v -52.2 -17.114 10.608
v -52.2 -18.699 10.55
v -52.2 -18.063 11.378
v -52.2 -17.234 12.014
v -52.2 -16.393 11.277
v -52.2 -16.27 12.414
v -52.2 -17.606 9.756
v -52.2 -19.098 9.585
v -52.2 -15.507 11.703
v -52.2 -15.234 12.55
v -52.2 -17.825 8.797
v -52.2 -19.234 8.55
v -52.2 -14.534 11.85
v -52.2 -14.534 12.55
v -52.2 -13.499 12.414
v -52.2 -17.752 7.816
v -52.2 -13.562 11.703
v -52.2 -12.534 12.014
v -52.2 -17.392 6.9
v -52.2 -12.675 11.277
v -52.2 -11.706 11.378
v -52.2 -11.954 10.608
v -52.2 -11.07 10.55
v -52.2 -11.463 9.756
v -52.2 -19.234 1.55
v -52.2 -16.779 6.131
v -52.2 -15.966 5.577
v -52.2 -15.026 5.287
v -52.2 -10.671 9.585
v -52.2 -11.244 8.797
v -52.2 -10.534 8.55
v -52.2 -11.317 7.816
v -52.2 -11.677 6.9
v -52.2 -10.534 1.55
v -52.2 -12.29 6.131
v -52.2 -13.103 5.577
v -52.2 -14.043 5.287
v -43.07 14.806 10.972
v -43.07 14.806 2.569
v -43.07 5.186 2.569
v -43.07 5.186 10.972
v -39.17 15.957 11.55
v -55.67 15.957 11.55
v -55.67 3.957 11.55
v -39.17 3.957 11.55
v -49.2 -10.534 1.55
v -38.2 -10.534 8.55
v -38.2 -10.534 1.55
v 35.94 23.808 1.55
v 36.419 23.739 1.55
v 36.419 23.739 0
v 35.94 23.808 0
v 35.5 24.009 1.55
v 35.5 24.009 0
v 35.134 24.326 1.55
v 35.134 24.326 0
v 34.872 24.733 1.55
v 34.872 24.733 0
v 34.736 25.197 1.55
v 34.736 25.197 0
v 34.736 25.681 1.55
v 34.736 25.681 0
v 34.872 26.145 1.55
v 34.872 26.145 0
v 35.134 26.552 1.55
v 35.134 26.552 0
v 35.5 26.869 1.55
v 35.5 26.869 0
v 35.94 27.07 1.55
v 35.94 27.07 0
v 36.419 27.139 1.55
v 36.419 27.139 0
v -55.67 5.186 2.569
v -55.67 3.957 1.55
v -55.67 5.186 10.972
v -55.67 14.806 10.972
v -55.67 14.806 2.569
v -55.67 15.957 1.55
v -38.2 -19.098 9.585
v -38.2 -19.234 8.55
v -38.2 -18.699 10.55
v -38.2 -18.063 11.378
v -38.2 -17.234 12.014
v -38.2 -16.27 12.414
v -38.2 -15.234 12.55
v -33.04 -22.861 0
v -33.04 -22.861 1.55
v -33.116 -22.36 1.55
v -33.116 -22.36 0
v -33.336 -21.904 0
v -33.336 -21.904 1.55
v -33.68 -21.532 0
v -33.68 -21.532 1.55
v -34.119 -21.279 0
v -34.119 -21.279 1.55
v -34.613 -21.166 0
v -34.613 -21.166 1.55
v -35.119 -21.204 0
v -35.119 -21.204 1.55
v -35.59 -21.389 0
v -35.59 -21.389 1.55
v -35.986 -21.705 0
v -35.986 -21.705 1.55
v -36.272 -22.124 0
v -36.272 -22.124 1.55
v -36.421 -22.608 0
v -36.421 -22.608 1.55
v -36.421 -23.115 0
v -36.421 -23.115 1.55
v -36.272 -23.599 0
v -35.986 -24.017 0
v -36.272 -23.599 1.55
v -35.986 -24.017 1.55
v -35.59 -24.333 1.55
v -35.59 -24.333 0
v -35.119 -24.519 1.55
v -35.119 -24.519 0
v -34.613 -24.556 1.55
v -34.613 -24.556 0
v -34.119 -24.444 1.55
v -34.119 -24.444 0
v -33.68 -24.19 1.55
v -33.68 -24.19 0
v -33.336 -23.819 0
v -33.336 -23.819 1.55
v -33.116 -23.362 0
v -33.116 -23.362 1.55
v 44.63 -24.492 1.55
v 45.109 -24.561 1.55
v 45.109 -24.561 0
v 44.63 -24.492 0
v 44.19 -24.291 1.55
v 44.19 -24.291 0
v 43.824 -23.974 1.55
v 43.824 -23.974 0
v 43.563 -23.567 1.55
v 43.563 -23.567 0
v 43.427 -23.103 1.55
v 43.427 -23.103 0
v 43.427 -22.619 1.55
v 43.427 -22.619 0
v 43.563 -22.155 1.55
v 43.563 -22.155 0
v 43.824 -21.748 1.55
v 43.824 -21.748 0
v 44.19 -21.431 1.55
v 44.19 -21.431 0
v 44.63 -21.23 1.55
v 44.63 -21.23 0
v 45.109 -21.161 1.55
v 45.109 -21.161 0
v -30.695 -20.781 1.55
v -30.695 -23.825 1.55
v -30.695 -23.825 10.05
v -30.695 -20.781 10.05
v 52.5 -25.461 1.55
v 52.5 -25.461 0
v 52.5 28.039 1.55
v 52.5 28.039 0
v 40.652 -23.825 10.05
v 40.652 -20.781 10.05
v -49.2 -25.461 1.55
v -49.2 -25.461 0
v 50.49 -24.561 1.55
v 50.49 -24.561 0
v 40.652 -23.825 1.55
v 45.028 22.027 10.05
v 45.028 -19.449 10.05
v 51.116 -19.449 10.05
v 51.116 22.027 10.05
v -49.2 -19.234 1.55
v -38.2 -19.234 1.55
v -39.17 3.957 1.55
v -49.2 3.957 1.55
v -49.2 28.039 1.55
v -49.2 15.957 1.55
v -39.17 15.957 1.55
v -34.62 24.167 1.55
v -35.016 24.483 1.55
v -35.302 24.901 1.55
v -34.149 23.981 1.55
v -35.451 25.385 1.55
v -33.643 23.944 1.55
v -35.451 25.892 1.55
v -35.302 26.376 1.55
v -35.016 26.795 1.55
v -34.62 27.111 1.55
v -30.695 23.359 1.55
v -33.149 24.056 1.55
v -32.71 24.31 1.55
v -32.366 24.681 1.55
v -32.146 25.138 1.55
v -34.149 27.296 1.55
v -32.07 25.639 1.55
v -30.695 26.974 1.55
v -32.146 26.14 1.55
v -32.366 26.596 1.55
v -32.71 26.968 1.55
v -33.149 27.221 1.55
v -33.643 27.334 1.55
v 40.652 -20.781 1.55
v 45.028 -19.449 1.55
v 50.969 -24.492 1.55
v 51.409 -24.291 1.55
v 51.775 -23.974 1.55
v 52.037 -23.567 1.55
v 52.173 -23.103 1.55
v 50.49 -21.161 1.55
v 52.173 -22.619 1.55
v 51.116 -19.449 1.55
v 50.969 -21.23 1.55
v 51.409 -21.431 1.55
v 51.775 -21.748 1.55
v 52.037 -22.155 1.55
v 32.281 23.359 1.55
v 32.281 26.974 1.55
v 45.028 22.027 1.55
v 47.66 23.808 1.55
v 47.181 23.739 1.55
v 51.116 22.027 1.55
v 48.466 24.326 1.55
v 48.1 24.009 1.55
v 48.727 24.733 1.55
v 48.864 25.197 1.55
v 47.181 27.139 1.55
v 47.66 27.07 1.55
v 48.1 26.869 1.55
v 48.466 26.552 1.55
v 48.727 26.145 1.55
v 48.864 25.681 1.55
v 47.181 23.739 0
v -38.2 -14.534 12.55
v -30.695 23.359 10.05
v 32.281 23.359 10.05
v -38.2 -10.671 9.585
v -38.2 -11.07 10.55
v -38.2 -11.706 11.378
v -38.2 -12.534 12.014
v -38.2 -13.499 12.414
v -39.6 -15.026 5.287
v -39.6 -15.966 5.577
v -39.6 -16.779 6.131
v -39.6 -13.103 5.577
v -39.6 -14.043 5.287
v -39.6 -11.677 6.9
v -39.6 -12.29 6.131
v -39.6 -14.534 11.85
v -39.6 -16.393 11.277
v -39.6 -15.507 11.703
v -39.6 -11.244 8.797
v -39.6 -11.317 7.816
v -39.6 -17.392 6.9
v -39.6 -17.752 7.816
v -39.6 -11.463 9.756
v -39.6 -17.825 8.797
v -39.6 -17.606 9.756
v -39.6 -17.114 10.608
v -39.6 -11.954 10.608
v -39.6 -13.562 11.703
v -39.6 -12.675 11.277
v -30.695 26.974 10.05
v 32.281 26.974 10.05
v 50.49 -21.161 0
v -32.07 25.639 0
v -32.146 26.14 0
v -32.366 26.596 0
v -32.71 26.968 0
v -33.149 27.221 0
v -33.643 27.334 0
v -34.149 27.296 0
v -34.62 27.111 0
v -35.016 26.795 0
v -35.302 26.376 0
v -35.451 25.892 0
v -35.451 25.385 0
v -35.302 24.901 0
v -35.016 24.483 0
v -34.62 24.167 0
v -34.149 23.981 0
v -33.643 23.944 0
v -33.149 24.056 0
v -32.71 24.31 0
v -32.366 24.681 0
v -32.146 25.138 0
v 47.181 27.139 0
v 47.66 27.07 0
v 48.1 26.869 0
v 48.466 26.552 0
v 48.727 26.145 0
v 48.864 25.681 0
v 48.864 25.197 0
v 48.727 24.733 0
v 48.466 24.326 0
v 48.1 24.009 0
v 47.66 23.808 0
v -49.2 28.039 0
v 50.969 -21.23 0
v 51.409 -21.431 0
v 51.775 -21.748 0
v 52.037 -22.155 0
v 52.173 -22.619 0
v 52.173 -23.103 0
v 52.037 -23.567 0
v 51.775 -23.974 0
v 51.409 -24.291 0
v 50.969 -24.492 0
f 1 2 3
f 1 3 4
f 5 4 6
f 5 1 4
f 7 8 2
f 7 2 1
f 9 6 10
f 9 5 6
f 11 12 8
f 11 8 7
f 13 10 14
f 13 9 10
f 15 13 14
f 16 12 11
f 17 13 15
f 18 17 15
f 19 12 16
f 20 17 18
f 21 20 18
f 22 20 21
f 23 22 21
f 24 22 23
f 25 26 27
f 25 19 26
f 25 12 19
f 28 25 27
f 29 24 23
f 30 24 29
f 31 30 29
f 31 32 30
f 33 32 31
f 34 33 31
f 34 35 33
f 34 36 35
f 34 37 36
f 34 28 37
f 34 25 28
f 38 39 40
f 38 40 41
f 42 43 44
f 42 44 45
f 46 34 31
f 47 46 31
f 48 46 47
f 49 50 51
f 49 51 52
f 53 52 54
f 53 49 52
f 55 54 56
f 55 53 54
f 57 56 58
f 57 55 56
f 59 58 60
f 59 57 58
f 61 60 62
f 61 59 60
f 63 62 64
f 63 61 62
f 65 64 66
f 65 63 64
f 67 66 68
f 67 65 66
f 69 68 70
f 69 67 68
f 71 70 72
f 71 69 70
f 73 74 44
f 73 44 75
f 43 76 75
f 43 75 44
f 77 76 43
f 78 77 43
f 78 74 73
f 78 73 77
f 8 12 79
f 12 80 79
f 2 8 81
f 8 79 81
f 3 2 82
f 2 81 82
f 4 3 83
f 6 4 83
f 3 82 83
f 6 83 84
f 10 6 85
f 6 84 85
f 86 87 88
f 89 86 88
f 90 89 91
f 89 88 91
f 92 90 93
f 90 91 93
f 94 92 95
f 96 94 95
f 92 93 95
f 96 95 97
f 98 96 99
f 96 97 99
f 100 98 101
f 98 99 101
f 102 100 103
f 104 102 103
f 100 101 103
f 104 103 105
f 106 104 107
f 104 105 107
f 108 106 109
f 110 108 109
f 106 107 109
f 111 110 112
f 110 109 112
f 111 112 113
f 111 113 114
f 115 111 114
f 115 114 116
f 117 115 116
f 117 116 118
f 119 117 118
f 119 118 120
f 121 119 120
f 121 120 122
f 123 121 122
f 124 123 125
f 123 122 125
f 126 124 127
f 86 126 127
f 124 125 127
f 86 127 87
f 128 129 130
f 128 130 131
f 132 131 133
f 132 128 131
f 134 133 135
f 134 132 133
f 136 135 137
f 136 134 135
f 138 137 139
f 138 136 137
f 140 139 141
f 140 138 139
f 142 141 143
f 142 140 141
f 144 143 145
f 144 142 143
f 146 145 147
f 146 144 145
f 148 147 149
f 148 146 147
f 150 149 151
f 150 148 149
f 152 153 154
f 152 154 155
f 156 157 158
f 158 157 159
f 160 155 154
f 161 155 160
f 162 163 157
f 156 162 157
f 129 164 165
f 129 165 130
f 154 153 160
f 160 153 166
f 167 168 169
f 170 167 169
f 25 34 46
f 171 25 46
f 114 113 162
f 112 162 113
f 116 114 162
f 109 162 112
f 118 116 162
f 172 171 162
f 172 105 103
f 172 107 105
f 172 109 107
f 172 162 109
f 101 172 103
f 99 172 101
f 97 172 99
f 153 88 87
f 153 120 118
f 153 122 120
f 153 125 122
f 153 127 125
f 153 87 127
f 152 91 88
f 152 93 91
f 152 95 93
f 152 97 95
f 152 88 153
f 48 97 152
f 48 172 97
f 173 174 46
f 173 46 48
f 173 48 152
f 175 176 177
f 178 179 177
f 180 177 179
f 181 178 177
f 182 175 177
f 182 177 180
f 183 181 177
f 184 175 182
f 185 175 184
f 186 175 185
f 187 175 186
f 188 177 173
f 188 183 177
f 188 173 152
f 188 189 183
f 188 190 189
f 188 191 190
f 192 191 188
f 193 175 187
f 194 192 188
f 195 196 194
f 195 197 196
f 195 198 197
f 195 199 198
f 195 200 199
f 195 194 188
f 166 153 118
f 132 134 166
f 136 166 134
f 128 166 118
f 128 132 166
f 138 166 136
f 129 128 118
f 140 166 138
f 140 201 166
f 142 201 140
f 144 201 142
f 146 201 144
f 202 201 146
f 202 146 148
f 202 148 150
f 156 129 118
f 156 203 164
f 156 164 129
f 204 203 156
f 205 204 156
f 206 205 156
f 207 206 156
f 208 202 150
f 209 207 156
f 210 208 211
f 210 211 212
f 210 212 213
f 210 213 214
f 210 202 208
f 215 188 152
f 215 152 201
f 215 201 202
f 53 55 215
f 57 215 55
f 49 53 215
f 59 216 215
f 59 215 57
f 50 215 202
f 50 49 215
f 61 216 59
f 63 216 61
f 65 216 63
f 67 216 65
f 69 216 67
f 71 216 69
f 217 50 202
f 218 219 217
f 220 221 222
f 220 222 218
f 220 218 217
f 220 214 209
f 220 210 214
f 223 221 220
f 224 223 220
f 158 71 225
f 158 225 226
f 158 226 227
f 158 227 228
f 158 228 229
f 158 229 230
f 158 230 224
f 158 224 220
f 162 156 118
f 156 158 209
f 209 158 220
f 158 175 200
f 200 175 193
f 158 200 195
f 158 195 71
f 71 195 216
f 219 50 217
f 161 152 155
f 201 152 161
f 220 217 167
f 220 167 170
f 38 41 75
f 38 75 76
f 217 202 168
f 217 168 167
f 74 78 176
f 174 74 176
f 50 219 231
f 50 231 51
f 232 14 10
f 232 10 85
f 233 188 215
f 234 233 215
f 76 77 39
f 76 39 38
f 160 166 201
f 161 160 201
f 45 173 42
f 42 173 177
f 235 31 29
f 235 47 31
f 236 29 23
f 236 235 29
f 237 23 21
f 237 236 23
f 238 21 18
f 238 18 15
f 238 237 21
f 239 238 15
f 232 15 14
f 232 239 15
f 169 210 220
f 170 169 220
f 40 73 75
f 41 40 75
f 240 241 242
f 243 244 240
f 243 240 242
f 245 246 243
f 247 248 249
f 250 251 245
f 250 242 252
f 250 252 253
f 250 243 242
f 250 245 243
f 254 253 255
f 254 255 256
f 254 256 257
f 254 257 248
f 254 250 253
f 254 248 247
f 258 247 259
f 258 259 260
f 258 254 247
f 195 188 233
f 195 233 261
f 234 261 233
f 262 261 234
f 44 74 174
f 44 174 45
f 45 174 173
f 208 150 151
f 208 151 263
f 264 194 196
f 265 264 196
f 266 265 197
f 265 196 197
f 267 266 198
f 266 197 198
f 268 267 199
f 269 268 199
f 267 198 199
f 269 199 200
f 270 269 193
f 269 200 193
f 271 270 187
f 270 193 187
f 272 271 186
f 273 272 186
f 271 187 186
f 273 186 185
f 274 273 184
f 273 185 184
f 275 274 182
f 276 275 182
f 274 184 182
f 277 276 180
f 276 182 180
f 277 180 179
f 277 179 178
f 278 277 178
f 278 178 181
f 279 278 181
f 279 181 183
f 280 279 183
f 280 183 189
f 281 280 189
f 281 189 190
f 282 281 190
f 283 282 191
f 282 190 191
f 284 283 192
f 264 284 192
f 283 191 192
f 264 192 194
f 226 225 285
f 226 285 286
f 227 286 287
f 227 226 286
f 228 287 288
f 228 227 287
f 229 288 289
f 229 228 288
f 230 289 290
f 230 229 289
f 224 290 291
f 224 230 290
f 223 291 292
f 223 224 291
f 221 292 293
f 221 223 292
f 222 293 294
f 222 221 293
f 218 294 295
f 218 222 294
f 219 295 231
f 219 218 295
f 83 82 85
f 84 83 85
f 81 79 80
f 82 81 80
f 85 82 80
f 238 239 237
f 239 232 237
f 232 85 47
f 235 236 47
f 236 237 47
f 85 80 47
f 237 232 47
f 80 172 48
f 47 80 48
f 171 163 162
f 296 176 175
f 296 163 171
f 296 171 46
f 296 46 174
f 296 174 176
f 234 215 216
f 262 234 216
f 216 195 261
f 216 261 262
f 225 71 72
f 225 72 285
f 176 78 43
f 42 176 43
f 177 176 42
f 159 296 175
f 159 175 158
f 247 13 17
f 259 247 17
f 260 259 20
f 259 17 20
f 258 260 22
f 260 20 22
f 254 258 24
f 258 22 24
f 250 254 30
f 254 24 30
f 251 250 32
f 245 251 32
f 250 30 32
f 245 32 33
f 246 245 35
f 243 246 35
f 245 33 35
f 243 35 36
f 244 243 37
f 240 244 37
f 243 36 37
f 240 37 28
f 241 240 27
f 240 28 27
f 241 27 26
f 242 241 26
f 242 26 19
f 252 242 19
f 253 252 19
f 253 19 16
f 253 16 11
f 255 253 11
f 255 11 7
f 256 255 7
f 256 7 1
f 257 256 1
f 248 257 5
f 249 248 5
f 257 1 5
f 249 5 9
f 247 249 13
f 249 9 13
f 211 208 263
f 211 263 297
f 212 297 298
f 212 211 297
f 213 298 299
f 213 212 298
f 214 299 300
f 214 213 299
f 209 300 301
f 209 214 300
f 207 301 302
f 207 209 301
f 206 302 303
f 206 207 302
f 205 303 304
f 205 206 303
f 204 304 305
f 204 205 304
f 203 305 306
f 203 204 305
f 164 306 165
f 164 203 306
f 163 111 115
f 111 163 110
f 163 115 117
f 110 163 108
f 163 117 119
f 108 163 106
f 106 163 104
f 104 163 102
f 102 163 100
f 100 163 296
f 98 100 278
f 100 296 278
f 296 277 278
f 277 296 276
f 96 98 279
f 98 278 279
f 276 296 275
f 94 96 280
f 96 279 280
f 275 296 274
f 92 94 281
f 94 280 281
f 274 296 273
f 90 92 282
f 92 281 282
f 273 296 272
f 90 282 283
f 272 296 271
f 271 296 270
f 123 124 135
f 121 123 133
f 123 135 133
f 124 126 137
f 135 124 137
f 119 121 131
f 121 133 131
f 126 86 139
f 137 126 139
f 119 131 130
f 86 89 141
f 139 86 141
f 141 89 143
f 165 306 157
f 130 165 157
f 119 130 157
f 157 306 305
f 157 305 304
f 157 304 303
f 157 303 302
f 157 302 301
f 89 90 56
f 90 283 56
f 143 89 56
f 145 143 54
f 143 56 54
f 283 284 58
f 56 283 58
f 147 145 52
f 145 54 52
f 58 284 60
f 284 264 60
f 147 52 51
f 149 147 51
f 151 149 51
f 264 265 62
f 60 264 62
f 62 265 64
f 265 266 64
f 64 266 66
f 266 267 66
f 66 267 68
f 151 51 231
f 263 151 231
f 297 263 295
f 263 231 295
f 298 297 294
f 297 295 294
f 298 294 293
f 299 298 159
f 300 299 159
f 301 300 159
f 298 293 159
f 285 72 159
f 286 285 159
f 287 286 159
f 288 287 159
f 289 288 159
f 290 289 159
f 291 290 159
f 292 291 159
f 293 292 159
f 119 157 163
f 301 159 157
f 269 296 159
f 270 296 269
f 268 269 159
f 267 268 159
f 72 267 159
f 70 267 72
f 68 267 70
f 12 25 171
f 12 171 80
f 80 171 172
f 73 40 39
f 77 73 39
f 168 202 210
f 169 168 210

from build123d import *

# Parameters (mm, degrees)
SKETCH_1_W          = 101.7
SKETCH_1_H          = 53.5
EXTRUDE_1_DEPTH     = 1.55
SKETCH_2_R          = 1.7
CUT_EXTRUDE_1_DEPTH = 1.55
SKETCH_3_W          = 16.5
SKETCH_3_H          = 12
EXTRUDE_2_DEPTH     = 10
SKETCH_4_W          = 14
SKETCH_4_H          = 8.7
EXTRUDE_3_DEPTH     = 11
FILLET_1_R          = 4
SKETCH_5_W          = 8.402583841
SKETCH_5_H          = 9.620349616
CUT_EXTRUDE_3_DEPTH = 12.6
SKETCH_6_R          = 3.3
CUT_EXTRUDE_4_DEPTH = 12.6
SKETCH_7_W          = 62.975416122
SKETCH_7_H          = 3.61490304
SKETCH_7_W_2        = 6.088257752
SKETCH_7_H_2        = 41.476255936
SKETCH_7_W_3        = 71.346770532
SKETCH_7_H_3        = 3.044128877
EXTRUDE_4_DEPTH     = 8.5


with BuildPart() as part:
    # 草图1 → 凸台-拉伸1 (new body)
    with BuildSketch(Plane.XY):
        with Locations((1.649757161, 1.28884807)):
            Rectangle(SKETCH_1_W, SKETCH_1_H)
    extrude(amount=EXTRUDE_1_DEPTH)

    # 草图2 → 切除-拉伸1 (cut)
    with BuildSketch(Plane.XY.offset(1.55)):
        with Locations((-34.740242839, -22.86115193)):
            Circle(SKETCH_2_R)
        with Locations((-33.770242839, 25.63884807)):
            Circle(SKETCH_2_R)
        with BuildLine():
            Line((36.418676462, 27.13884807), (47.180837859, 27.13884807))
            ThreePointArc((47.180837859, 27.13884807), (48.880837859, 25.43884807), (47.180837859, 23.73884807))
            Line((47.180837859, 23.73884807), (36.418676462, 23.73884807))
            ThreePointArc((36.418676462, 23.73884807), (34.718676462, 25.43884807), (36.418676462, 27.13884807))
        make_face()
        with BuildLine():
            Line((45.109216811, -21.16115193), (50.49029751, -21.16115193))
            ThreePointArc((50.49029751, -21.16115193), (52.19029751, -22.86115193), (50.49029751, -24.56115193))
            Line((50.49029751, -24.56115193), (45.109216811, -24.56115193))
            ThreePointArc((45.109216811, -24.56115193), (43.409216811, -22.86115193), (45.109216811, -21.16115193))
        make_face()
    extrude(amount=-CUT_EXTRUDE_1_DEPTH, mode=Mode.SUBTRACT)

    # 草图3 → 凸台-拉伸2 (add)
    with BuildSketch(Plane.XY.offset(1.55)):
        with Locations((-47.420242839, 9.956852339)):
            Rectangle(SKETCH_3_W, SKETCH_3_H)
    extrude(amount=EXTRUDE_2_DEPTH)

    # 草图4 → 凸台-拉伸3 (add)
    with BuildSketch(Plane.XY.offset(1.55)):
        with Locations((-45.200242839, -14.884453356)):
            Rectangle(SKETCH_4_W, SKETCH_4_H)
    extrude(amount=EXTRUDE_3_DEPTH)

    # 圆角1
    fillet_1_edges = [part.edges().sort_by_distance(p)[0] for p in [
        (-45.200242839, -10.534453356, 12.55),
        (-45.200242839, -19.234453356, 12.55),
    ]]
    fillet(fillet_1_edges, radius=FILLET_1_R)

    # 草图5 → 切除-拉伸3 (cut)
    with BuildSketch(Plane.ZY.offset(55.670242839)):
        with Locations((6.770558557, 9.995873355)):
            Rectangle(SKETCH_5_W, SKETCH_5_H)
    extrude(amount=-CUT_EXTRUDE_3_DEPTH, mode=Mode.SUBTRACT)

    # 草图6 → 切除-拉伸4 (cut)
    with BuildSketch(Plane.ZY.offset(52.200242839)):
        with Locations((8.55, -14.534453356)):
            Circle(SKETCH_6_R)
    extrude(amount=-CUT_EXTRUDE_4_DEPTH, mode=Mode.SUBTRACT)

    # 草图7 → 凸台-拉伸4 (add)
    with BuildSketch(Plane.XY.offset(1.55)):
        with Locations((0.792982845, 25.166233941)):
            Rectangle(SKETCH_7_W, SKETCH_7_H)
        with Locations((48.072109451, 1.28884807)):
            Rectangle(SKETCH_7_W_2, SKETCH_7_H_2)
        with Locations((4.97866005, -22.30315072)):
            Rectangle(SKETCH_7_W_3, SKETCH_7_H_3)
    extrude(amount=EXTRUDE_4_DEPTH)


solid = part.part
